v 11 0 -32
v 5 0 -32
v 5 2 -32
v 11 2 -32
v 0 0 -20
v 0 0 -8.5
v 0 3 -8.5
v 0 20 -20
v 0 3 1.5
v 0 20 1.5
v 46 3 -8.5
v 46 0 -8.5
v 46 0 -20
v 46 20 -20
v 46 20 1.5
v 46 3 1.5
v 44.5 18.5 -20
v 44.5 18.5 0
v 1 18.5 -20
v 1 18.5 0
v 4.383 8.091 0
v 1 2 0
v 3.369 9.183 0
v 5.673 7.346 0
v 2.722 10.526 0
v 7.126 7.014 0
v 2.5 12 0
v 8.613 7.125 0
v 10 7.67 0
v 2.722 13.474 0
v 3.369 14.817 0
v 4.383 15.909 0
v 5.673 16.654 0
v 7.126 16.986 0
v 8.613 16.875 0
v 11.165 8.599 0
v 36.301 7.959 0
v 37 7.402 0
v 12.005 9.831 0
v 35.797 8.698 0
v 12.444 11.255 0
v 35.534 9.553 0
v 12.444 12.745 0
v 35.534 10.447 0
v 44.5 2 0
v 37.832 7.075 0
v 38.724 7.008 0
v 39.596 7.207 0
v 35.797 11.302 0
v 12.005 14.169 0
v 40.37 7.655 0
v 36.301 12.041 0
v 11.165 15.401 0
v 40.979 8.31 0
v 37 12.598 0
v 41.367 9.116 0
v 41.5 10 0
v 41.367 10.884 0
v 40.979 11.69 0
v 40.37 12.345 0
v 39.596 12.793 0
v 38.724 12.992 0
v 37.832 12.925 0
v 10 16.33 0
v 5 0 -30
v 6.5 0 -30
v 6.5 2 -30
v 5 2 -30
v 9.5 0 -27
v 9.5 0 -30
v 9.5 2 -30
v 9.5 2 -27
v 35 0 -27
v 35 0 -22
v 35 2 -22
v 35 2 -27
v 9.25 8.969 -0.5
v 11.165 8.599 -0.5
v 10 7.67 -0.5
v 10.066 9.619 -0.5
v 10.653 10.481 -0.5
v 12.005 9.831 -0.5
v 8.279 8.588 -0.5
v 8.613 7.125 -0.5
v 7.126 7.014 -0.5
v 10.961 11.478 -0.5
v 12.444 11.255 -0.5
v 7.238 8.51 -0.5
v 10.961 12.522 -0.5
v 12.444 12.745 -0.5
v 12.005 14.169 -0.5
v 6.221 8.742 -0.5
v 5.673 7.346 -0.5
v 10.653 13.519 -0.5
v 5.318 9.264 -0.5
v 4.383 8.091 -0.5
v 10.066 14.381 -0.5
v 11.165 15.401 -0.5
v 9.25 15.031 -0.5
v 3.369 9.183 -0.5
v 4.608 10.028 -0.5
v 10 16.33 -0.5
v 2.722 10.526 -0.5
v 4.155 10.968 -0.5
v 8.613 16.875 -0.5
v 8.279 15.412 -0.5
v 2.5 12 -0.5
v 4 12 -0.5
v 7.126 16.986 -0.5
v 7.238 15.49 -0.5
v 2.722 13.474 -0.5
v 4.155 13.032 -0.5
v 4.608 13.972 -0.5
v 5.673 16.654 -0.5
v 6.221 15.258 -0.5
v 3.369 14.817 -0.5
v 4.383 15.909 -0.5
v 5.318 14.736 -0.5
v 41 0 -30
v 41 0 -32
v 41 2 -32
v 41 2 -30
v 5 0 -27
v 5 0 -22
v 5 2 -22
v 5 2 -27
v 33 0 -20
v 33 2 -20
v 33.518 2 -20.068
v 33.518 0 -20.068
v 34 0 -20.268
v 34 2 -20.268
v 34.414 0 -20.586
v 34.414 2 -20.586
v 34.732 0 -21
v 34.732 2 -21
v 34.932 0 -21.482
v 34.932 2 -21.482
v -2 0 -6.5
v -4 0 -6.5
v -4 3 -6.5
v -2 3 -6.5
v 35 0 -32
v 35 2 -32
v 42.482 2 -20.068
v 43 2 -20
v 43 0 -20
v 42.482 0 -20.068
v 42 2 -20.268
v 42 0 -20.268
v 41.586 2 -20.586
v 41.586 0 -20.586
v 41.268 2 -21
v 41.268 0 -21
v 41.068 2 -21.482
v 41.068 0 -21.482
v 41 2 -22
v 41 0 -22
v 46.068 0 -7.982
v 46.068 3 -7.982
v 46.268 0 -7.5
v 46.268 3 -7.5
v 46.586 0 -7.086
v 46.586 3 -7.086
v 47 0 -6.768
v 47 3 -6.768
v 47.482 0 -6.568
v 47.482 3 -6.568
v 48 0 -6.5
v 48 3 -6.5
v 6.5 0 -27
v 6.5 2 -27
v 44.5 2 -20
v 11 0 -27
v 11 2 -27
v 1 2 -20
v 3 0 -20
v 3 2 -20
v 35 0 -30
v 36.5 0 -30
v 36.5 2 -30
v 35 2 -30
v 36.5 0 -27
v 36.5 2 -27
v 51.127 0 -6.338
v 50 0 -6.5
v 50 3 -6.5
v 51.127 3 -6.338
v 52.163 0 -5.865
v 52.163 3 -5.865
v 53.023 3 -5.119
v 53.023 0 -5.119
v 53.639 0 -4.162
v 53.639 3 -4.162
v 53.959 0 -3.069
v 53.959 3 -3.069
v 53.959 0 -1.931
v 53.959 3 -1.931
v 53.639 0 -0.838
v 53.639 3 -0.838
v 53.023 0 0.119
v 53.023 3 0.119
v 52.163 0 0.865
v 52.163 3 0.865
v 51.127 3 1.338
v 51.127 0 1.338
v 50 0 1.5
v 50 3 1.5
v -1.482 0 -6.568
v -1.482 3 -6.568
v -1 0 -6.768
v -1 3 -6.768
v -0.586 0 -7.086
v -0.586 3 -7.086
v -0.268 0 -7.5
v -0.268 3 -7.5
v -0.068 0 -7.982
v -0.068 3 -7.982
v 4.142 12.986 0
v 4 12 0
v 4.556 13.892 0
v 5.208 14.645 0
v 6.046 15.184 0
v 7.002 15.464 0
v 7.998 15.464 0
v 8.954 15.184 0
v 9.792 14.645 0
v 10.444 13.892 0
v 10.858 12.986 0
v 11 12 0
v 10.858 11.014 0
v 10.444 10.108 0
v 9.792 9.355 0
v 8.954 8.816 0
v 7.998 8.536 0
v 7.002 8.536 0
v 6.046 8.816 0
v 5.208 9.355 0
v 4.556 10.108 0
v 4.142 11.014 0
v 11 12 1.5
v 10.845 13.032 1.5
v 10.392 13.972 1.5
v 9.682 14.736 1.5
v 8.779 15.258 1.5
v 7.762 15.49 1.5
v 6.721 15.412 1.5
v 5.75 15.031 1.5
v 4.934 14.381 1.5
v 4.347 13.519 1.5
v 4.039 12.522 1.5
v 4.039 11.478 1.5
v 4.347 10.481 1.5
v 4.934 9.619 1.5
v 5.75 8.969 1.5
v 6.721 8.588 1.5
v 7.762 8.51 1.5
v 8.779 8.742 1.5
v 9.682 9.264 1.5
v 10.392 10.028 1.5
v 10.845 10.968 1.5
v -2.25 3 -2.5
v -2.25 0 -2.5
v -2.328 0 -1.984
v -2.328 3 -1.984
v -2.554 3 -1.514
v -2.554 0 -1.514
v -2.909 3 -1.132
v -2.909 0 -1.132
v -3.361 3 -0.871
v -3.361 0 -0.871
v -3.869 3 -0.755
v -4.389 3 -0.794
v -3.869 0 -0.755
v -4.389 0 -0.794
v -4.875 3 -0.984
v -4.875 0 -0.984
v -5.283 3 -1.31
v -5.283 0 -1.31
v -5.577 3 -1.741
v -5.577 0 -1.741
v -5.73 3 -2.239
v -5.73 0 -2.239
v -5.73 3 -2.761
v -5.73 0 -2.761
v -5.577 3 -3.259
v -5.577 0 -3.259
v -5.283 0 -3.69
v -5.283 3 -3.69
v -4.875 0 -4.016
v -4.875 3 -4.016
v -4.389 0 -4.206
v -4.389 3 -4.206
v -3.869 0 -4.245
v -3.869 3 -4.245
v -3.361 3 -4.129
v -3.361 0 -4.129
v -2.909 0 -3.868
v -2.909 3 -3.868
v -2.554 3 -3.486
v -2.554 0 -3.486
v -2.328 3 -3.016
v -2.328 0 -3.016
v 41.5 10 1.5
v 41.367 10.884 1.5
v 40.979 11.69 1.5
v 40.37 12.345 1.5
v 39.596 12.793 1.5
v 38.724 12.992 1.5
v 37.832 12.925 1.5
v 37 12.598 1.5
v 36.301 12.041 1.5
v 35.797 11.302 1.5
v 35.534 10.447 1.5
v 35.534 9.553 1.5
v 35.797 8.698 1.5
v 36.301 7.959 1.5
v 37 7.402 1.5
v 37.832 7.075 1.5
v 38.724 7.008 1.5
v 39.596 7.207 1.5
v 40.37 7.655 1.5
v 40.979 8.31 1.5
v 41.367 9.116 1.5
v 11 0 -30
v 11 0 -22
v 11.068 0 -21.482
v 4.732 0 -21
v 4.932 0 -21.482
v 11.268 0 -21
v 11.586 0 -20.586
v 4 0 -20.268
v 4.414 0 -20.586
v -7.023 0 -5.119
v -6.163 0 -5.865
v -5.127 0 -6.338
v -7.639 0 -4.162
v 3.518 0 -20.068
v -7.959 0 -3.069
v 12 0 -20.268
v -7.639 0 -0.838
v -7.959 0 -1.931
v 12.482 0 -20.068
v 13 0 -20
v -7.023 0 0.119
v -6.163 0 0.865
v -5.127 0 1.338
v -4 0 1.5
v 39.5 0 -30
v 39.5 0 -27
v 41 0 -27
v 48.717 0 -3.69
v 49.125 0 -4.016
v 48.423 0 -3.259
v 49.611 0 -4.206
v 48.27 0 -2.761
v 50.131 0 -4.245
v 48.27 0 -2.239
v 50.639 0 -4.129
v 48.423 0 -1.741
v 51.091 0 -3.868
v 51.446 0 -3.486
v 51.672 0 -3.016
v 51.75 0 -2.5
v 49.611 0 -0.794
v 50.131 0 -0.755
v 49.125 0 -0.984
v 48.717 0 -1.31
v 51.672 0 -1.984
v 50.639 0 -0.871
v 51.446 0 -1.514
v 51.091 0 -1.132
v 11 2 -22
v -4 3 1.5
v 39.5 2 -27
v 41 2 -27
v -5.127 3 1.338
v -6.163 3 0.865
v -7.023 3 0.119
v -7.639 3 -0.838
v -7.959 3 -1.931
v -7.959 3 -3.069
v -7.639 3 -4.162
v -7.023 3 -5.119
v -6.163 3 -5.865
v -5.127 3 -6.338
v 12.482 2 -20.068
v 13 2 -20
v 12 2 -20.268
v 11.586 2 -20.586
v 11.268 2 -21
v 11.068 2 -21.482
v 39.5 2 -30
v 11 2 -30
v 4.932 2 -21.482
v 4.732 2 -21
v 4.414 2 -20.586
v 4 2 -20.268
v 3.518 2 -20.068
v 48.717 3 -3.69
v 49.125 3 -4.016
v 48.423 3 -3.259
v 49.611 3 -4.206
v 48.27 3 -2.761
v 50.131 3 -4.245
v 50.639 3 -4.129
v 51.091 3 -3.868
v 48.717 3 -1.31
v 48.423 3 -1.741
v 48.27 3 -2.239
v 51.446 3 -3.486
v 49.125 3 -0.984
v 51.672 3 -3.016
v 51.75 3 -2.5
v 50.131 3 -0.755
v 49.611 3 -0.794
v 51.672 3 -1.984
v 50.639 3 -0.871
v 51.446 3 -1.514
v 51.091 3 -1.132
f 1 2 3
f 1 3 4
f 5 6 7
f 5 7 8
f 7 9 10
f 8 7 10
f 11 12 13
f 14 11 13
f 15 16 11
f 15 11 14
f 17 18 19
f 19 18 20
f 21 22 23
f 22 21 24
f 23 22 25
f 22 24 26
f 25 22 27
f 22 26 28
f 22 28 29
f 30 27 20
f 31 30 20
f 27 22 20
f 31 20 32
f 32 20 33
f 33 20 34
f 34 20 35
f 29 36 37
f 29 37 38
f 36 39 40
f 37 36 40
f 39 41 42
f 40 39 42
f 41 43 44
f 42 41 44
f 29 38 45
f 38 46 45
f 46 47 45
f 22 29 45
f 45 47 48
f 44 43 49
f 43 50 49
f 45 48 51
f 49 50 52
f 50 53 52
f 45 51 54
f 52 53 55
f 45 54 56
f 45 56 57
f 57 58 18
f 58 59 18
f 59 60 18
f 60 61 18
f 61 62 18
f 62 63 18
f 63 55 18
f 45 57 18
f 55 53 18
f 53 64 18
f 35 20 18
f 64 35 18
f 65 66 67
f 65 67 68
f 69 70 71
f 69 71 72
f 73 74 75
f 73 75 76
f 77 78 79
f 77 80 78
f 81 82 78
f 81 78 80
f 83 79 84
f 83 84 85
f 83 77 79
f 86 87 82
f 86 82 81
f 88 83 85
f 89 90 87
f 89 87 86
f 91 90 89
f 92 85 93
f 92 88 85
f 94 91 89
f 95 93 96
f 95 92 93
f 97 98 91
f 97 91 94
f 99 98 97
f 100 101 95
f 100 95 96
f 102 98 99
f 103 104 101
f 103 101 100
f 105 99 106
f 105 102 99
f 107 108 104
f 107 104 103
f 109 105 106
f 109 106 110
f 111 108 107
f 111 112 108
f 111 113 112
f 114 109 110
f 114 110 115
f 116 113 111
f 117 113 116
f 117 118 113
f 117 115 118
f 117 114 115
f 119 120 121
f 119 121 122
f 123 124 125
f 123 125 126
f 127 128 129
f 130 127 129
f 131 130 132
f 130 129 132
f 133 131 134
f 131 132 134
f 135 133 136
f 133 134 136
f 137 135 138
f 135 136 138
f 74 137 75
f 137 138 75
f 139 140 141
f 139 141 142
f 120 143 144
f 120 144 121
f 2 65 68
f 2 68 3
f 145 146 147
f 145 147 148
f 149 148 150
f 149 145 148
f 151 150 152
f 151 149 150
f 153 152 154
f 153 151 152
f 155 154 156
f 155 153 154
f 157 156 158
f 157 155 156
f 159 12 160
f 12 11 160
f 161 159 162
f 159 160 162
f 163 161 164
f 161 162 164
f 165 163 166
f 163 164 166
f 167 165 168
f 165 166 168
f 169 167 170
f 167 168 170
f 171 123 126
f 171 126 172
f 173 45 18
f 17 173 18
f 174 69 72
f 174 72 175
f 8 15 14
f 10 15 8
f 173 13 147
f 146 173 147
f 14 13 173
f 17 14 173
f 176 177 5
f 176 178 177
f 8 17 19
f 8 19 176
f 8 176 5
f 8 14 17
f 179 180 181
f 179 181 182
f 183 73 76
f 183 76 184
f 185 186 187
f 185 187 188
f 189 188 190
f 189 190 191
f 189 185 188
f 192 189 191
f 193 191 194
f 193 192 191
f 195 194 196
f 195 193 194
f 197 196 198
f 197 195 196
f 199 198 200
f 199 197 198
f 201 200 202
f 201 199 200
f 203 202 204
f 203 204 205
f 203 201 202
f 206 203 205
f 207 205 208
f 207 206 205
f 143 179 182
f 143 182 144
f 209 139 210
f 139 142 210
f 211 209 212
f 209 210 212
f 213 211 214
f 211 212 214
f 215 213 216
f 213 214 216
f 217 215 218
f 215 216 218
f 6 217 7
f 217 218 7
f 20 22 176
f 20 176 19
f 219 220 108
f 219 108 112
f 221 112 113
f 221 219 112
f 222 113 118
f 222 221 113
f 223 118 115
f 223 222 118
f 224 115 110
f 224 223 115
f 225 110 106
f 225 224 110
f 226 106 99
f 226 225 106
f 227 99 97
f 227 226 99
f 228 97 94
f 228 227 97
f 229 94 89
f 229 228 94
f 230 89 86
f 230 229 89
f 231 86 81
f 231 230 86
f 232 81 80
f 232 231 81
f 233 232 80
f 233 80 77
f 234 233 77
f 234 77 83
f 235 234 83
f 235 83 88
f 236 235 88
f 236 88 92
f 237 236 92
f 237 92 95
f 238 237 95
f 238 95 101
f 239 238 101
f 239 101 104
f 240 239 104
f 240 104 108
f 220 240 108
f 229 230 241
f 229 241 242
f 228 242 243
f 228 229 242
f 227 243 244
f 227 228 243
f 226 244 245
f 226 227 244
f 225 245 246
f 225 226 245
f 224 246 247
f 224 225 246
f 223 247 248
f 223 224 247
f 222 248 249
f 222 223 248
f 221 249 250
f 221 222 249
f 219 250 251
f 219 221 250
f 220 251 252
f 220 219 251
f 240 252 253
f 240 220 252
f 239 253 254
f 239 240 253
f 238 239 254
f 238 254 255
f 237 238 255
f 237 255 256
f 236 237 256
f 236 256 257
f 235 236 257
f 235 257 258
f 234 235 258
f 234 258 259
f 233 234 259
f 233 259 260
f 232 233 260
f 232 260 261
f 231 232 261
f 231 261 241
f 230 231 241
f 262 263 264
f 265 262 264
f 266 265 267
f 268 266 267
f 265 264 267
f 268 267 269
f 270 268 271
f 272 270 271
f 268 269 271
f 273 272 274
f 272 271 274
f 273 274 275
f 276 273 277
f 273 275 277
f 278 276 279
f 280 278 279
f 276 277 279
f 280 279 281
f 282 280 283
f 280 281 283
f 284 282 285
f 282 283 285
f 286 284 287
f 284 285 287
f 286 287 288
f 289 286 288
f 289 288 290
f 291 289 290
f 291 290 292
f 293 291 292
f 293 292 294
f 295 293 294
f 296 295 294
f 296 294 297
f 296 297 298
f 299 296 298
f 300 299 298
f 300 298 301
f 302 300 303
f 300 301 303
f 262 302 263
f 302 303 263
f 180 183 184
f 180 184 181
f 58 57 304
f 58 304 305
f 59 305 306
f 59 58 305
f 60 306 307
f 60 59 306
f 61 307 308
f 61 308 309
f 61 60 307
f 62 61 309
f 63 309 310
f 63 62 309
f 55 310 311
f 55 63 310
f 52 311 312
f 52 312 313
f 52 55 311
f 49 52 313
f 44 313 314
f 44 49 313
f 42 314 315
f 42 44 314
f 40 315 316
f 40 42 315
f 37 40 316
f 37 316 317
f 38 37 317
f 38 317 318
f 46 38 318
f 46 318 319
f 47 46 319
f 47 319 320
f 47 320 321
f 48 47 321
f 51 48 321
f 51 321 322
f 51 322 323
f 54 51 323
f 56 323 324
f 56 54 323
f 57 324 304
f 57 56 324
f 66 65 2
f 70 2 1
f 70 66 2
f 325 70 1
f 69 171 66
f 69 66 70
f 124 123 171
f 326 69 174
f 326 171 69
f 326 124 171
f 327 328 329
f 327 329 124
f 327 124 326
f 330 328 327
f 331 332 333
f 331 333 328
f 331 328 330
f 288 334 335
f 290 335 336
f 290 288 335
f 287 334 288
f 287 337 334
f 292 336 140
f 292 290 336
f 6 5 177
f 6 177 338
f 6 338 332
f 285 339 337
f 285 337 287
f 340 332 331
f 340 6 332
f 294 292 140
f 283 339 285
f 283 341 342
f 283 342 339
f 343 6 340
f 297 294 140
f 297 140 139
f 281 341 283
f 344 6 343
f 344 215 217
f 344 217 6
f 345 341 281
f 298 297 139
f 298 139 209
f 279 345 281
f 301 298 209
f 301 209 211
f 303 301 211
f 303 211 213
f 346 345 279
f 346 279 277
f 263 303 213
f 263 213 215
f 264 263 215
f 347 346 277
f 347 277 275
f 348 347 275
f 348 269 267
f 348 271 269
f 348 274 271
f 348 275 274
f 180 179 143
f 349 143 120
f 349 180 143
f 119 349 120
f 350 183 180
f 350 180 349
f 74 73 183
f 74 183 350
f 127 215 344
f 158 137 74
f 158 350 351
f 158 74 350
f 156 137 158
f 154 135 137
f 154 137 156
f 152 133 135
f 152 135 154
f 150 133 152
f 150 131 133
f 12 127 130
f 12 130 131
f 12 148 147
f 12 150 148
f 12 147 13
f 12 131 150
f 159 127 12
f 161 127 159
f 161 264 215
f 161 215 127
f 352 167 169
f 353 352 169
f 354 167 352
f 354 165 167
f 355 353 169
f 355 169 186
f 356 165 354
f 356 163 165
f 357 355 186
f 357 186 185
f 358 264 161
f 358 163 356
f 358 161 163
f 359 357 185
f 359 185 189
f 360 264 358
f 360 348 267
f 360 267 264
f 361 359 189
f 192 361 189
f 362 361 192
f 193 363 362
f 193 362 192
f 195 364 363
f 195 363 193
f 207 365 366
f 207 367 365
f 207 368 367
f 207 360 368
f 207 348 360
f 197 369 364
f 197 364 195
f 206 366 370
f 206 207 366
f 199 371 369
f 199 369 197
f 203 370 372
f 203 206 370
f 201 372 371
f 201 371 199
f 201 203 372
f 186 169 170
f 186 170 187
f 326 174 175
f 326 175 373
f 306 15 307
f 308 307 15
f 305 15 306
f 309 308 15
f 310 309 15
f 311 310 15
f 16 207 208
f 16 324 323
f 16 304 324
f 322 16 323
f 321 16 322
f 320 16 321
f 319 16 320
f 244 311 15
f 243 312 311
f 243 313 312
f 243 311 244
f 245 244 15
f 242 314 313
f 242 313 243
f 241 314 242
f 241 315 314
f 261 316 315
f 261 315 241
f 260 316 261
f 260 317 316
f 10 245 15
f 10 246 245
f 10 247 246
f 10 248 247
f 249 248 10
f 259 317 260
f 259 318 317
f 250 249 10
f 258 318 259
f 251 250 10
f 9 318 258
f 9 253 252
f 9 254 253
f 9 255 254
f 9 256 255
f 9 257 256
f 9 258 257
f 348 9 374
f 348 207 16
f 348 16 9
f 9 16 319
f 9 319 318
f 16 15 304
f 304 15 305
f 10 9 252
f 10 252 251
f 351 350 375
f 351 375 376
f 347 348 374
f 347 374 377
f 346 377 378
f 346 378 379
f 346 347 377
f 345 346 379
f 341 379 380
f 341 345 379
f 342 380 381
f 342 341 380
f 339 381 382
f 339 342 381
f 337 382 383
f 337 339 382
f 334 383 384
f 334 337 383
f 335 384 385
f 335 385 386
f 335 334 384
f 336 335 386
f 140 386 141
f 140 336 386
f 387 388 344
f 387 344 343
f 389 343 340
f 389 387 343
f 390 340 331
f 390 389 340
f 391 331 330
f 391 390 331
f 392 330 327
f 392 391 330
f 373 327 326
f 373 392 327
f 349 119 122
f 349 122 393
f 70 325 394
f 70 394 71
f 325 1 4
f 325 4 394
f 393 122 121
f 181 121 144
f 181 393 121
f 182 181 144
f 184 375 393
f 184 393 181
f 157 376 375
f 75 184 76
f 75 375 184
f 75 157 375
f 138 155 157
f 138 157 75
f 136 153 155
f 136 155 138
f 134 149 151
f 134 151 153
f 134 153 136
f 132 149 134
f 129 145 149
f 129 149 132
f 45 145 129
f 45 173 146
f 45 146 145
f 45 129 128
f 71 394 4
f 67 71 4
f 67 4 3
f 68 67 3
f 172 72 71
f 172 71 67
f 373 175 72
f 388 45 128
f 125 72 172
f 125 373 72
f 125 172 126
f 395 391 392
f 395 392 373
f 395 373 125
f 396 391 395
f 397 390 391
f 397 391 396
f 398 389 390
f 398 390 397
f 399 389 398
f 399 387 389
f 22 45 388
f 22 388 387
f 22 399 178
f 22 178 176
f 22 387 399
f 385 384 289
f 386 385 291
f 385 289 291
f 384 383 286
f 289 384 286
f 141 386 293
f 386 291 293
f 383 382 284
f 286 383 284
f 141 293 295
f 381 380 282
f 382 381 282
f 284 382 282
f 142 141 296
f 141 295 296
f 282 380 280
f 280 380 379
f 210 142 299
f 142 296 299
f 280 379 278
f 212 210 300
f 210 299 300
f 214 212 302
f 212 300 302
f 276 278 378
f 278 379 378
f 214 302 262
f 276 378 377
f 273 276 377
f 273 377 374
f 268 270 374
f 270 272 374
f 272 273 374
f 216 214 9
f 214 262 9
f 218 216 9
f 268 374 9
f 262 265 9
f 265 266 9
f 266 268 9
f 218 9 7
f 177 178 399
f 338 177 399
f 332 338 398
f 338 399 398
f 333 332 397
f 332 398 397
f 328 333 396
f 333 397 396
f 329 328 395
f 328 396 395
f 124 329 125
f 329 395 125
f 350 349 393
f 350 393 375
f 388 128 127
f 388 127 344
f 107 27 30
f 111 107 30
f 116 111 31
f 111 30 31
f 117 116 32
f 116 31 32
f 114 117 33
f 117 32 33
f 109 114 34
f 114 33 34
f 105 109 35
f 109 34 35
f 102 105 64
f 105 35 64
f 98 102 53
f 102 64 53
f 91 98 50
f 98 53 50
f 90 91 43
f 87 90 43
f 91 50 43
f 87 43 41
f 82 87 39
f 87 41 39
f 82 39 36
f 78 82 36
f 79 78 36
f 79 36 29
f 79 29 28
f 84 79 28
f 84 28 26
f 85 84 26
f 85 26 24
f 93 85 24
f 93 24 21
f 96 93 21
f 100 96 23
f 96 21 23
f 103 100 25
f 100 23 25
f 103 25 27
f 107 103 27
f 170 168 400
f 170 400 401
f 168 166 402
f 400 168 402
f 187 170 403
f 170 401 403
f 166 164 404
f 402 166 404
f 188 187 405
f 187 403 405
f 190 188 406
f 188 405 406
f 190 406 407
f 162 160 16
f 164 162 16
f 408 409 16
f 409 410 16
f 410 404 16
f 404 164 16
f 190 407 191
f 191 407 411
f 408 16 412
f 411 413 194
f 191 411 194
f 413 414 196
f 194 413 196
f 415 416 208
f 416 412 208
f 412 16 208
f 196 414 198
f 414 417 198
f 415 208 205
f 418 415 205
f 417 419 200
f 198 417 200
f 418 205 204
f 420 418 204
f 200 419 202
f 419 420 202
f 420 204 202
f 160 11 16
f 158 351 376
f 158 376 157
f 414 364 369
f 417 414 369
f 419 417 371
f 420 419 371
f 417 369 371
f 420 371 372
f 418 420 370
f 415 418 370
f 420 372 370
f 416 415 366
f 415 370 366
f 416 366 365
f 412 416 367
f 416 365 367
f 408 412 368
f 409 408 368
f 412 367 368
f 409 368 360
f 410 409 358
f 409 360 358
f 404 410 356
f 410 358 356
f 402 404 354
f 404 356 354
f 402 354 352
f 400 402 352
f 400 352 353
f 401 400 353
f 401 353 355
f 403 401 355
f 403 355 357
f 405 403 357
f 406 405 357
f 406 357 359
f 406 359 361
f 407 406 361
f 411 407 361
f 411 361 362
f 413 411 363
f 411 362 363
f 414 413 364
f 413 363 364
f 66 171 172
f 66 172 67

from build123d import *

# Parameters (mm, degrees)
SKETCH_1_W      = 46
SKETCH_1_H      = 20
SKETCH_1_R      = 3.5
SKETCH_1_R_2    = 3
EXTRUDE_1_DEPTH = 1.5
SKETCH_2_R      = 5
SKETCH_2_R_2    = 3.5
EXTRUDE_2_DEPTH = 0.5
SKETCH_3_W      = 46
SKETCH_3_H      = 20
SKETCH_3_W_2    = 43.5
SKETCH_3_H_2    = 16.5
EXTRUDE_3_DEPTH = 20
SKETCH_4_R      = 1.75
EXTRUDE_4_DEPTH = 3
FILLET_1_R      = 2
EXTRUDE_5_DEPTH = 2
FILLET_2_R      = 2


with BuildPart() as part:
    # Эскиз1 → Бобышка-Вытянуть1 (new body)
    with BuildSketch(Plane.XY):
        with Locations((23, 10)):
            Rectangle(SKETCH_1_W, SKETCH_1_H)
        with Locations((7.5, 12)):
            Circle(SKETCH_1_R, mode=Mode.SUBTRACT)
        with Locations((38.5, 10)):
            Circle(SKETCH_1_R_2, mode=Mode.SUBTRACT)
    extrude(amount=EXTRUDE_1_DEPTH)

    # Эскиз2 → Бобышка-Вытянуть2 (add)
    with BuildSketch(Plane(origin=(0, 0, 0), x_dir=(-1, 0, 0), z_dir=(0, 0, -1))):
        with Locations((-7.5, 12)):
            Circle(SKETCH_2_R)
        with Locations((-7.5, 12)):
            Circle(SKETCH_2_R_2, mode=Mode.SUBTRACT)
    extrude(amount=EXTRUDE_2_DEPTH)

    # Эскиз3 → Бобышка-Вытянуть3 (add)
    with BuildSketch(Plane(origin=(0, 0, 0), x_dir=(-1, 0, 0), z_dir=(0, 0, -1))):
        with Locations((-23, 10)):
            Rectangle(SKETCH_3_W, SKETCH_3_H)
        with Locations((-22.75, 10.25)):
            Rectangle(SKETCH_3_W_2, SKETCH_3_H_2, mode=Mode.SUBTRACT)
    extrude(amount=EXTRUDE_3_DEPTH)

    # Эскиз4 → Бобышка-Вытянуть4 (add)
    with BuildSketch(Plane.XZ):
        with BuildLine():
            Line((0, 1.5), (-4, 1.5))
            ThreePointArc((-4, 1.5), (-8, -2.5), (-4, -6.5))
            Line((-4, -6.5), (0, -6.5))
            Line((0, -6.5), (0, 1.5))
        make_face()
        with Locations((-4, -2.5)):
            Circle(SKETCH_4_R, mode=Mode.SUBTRACT)
        with BuildLine():
            Line((50, 1.5), (46, 1.5))
            Line((46, 1.5), (46, -6.5))
            Line((46, -6.5), (50, -6.5))
            ThreePointArc((50, -6.5), (54, -2.5), (50, 1.5))
        make_face()
        with Locations((50, -2.5)):
            Circle(SKETCH_4_R, mode=Mode.SUBTRACT)
    extrude(amount=-EXTRUDE_4_DEPTH)

    # Скругление1
    fillet_1_edges = [part.edges().sort_by_distance(p)[0] for p in [
        (0, 1.5, -6.5),
        (46, 1.5, -6.5),
    ]]
    fillet(fillet_1_edges, radius=FILLET_1_R)

    # Эскиз5 → Бобышка-Вытянуть5 (add)
    with BuildSketch(Plane.XZ):
        Polygon((41, -20), (35, -20), (35, -27), (36.5, -27), (36.5, -30), (35, -30), (35, -32), (41, -32), (41, -30), (39.5, -30), (39.5, -27), (41, -27), align=None)
        Polygon((11, -20), (5, -20), (5, -27), (6.5, -27), (6.5, -30), (5, -30), (5, -32), (11, -32), (11, -30), (9.5, -30), (9.5, -27), (11, -27), align=None)
    extrude(amount=-EXTRUDE_5_DEPTH)

    # Скругление2
    fillet_2_edges = [part.edges().sort_by_distance(p)[0] for p in [
        (41, 1, -20),
        (35, 1, -20),
        (11, 1, -20),
        (5, 1, -20),
    ]]
    fillet(fillet_2_edges, radius=FILLET_2_R)


solid = part.part
